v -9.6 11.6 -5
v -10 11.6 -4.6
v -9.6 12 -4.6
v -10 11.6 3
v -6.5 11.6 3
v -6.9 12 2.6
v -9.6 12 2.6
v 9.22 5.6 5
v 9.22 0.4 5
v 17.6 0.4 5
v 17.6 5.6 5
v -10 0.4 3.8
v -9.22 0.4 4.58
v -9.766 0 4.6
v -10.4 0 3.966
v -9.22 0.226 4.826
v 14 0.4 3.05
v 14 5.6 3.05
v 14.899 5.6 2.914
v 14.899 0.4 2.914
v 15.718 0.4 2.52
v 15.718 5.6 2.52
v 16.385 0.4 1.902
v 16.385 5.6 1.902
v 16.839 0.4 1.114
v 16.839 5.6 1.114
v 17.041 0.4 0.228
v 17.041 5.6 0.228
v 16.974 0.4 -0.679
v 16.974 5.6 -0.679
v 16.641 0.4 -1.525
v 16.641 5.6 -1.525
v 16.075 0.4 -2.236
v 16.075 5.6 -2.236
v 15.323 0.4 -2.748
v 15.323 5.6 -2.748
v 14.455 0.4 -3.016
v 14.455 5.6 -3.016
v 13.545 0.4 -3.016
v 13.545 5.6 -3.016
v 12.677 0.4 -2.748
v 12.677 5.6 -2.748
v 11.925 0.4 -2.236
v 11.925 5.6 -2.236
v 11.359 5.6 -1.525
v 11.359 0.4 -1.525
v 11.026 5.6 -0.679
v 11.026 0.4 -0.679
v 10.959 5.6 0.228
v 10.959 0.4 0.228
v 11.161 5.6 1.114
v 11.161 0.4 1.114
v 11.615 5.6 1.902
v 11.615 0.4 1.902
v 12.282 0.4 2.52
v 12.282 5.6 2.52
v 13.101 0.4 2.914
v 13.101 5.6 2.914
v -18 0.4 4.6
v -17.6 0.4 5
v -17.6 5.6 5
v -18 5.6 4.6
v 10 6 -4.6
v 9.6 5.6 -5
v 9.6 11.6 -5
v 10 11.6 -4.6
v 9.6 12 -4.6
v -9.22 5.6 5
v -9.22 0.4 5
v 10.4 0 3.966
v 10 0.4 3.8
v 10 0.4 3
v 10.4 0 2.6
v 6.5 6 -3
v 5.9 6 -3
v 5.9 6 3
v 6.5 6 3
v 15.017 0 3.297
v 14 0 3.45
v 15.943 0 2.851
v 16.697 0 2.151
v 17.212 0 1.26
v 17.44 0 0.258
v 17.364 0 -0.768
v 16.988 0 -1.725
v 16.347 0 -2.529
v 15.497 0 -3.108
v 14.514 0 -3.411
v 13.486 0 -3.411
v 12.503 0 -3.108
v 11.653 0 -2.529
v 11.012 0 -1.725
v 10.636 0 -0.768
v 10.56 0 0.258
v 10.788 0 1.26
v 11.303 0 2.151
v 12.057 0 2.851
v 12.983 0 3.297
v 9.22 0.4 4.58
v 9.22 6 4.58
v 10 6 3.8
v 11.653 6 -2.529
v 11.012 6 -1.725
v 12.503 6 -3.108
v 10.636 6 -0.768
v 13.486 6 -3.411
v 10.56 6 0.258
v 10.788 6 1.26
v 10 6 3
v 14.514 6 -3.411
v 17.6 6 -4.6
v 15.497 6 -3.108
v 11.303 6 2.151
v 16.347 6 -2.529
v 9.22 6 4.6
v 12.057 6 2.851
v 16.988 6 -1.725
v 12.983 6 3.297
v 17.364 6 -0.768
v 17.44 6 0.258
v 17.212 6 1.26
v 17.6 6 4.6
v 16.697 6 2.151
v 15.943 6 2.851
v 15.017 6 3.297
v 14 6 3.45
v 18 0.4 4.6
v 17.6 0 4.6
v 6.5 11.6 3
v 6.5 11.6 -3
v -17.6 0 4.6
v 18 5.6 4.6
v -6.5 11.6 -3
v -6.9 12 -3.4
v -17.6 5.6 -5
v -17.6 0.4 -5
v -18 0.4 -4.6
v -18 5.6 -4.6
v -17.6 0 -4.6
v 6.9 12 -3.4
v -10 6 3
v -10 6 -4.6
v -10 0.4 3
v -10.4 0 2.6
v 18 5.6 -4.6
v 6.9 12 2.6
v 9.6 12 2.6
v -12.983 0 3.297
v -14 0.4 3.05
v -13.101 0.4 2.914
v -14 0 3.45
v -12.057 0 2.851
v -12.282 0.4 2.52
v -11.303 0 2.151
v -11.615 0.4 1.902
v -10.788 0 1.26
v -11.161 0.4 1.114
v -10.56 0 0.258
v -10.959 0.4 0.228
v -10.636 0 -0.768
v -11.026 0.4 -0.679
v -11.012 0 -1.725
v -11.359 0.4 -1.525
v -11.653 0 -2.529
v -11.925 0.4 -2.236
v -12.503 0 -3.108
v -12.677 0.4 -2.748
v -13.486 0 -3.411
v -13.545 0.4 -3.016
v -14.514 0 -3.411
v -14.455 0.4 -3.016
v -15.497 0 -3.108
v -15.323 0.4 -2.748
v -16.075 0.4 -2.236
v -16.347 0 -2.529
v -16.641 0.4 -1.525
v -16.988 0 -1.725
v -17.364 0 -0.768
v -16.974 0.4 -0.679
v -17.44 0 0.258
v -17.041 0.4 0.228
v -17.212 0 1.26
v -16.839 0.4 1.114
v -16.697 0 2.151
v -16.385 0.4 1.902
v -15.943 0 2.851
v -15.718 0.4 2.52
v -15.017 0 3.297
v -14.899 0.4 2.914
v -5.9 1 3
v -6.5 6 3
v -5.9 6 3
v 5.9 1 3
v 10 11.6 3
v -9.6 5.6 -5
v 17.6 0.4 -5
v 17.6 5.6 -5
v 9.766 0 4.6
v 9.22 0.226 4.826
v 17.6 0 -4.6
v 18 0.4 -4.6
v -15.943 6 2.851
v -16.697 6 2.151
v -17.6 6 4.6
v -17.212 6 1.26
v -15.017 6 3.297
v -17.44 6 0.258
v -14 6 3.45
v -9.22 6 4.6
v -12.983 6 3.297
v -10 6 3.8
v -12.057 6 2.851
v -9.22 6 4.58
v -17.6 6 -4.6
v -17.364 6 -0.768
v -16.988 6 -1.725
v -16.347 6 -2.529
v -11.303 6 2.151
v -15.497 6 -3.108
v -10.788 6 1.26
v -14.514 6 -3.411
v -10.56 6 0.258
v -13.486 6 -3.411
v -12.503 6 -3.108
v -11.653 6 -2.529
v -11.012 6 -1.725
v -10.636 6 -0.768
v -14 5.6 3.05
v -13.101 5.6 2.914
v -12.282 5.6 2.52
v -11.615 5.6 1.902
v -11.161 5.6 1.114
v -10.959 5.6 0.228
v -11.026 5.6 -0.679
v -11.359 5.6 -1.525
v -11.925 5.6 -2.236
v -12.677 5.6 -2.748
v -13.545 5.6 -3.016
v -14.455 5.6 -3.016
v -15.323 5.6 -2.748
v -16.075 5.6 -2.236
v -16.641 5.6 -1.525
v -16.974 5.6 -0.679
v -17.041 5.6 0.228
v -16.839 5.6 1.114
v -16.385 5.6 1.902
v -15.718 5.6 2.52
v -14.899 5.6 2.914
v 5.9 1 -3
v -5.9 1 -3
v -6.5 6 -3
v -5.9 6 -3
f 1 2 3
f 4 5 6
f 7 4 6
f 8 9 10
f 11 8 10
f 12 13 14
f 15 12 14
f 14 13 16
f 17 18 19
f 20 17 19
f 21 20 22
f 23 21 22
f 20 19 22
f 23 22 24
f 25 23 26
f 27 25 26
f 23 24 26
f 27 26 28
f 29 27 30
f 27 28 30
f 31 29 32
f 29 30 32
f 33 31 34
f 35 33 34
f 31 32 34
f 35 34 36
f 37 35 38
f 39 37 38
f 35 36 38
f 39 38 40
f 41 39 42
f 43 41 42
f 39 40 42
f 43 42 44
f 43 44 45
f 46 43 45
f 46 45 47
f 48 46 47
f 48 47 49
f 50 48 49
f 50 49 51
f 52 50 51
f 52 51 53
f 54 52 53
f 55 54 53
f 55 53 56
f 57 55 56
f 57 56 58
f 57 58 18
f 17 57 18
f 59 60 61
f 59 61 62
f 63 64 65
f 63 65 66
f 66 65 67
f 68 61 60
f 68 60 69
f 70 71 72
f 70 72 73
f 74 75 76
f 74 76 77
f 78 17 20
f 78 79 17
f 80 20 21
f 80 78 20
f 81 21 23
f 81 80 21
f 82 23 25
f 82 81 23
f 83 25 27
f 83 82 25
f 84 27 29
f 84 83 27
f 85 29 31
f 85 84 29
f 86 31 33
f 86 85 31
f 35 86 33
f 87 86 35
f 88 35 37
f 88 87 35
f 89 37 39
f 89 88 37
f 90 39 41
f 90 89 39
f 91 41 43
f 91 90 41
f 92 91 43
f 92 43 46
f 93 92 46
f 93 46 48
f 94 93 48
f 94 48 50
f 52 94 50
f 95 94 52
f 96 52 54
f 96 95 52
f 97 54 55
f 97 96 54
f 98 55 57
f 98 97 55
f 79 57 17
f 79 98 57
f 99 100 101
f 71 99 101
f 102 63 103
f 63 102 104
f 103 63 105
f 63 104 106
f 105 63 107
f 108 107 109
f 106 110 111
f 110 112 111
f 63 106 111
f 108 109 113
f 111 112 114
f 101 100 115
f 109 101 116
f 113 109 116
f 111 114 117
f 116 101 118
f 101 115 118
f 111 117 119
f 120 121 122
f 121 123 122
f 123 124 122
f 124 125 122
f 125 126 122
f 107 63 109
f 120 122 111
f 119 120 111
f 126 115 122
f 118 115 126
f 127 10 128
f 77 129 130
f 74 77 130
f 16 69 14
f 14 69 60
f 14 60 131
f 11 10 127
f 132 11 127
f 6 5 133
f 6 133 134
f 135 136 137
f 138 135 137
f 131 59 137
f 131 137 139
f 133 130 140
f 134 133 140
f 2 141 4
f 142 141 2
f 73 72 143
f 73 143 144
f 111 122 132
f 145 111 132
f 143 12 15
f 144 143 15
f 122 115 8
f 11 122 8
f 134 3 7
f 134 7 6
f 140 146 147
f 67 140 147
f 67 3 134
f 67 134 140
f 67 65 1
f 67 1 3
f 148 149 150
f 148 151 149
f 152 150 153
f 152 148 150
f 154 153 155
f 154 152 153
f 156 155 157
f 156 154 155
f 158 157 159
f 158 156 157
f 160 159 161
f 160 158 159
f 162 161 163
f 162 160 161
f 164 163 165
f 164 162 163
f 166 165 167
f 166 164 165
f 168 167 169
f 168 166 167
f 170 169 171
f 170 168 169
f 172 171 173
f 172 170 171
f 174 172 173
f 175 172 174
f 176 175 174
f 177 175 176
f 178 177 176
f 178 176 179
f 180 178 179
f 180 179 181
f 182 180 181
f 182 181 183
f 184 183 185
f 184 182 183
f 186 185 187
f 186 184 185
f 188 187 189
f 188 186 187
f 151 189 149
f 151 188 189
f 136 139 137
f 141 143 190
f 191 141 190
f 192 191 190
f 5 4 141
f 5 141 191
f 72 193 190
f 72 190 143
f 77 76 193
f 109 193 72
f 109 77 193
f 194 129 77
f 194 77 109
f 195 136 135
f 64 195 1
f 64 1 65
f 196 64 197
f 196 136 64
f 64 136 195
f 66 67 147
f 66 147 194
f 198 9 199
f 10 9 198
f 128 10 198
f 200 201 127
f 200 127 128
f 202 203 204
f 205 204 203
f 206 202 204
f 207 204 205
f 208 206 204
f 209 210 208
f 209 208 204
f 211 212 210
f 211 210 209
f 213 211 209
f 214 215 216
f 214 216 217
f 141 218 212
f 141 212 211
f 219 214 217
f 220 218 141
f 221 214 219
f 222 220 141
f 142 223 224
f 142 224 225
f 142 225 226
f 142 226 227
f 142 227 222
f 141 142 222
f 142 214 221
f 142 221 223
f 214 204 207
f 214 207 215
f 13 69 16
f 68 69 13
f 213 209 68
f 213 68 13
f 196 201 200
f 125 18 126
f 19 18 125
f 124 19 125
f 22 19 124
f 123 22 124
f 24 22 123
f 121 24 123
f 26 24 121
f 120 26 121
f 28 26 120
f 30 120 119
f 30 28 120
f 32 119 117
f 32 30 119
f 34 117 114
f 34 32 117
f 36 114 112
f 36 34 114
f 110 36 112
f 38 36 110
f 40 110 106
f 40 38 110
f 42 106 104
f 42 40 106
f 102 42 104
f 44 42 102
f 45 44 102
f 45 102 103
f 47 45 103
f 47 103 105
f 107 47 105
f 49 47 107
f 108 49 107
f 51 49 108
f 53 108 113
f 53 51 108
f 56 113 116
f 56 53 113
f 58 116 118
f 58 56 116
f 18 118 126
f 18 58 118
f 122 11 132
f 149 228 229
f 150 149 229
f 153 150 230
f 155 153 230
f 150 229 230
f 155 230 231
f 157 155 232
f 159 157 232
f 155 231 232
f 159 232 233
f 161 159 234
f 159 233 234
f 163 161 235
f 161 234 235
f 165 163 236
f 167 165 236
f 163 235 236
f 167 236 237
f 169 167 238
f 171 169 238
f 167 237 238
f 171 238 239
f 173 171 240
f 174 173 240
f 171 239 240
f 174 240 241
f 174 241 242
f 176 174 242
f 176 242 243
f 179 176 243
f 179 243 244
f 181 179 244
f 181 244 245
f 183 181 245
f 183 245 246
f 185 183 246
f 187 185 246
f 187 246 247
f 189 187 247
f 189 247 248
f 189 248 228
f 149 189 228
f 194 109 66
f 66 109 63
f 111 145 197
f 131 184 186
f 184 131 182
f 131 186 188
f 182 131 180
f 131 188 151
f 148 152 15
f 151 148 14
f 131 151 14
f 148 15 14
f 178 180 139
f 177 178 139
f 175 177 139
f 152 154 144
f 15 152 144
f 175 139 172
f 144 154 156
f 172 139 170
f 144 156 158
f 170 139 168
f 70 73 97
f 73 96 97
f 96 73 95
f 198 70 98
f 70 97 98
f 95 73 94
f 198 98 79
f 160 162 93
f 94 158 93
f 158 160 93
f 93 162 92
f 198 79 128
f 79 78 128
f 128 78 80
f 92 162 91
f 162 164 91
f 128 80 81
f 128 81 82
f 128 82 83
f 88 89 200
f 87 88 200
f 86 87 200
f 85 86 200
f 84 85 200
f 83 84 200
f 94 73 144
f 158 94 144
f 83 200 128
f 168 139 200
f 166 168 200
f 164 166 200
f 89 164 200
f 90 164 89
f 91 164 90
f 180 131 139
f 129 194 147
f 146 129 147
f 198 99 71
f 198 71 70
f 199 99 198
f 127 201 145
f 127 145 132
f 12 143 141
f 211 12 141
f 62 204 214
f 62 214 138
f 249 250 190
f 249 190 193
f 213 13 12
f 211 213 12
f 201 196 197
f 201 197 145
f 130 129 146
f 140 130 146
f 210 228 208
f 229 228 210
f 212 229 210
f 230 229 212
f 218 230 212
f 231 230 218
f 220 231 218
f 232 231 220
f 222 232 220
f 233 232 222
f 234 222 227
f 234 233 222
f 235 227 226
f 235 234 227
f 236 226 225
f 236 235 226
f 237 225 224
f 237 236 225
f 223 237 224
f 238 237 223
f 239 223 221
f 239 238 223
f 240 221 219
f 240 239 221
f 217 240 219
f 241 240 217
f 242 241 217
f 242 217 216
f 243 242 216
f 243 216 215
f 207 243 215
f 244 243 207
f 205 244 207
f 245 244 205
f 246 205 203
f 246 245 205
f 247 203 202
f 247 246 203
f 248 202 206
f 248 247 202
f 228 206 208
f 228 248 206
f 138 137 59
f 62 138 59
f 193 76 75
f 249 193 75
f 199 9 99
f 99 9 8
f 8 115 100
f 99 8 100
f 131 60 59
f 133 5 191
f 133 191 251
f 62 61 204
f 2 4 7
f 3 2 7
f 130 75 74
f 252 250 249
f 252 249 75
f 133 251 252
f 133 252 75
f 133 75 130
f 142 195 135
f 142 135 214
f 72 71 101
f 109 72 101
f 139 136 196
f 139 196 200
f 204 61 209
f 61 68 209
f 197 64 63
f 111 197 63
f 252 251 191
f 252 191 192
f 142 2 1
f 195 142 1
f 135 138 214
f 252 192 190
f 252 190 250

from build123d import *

# Parameters (mm, degrees)
SKETCH1_W           = 20
SKETCH1_H           = 10
BOSS_EXTRUDE1_DEPTH = 12
SKETCH2_W           = 36
SKETCH2_H           = 10
BOSS_EXTRUDE2_DEPTH = 6
SKETCH3_R           = 3.05
CUT_EXTRUDE1_DEPTH  = 20.62141687
SKETCH4_W           = 13
SKETCH4_H           = 6
CUT_EXTRUDE2_DEPTH  = 6
SKETCH5_W           = 20
SKETCH5_H           = 12
CUT_EXTRUDE3_DEPTH  = 2
SKETCH6_W           = 11.8
SKETCH6_H           = 6
CUT_EXTRUDE4_DEPTH  = 5
BOSS_EXTRUDE3_DEPTH = 6


with BuildPart() as part:
    # Sketch1 → Boss-Extrude1 (new body)
    with BuildSketch(Plane(origin=(0, 0, 0), x_dir=(1, 0, 0), z_dir=(0, 1, 0))):
        Rectangle(SKETCH1_W, SKETCH1_H)
    extrude(amount=BOSS_EXTRUDE1_DEPTH)

    # Sketch2 → Boss-Extrude2 (add)
    with BuildSketch(Plane.XZ):
        Rectangle(SKETCH2_W, SKETCH2_H)
    extrude(amount=-BOSS_EXTRUDE2_DEPTH)

    # Sketch3 → Cut-Extrude1 (cut, through all)
    with BuildSketch(Plane(origin=(0, 6, 0), x_dir=(1, 0, 0), z_dir=(0, 1, 0))):
        with Locations(Location((-14, 0, 0), (0, 0, 270))):
            Circle(SKETCH3_R)
        with Locations(Location((14, 0, 0), (0, 0, 270))):
            Circle(SKETCH3_R)
    extrude(amount=-CUT_EXTRUDE1_DEPTH, mode=Mode.SUBTRACT)

    # Sketch4 → Cut-Extrude2 (cut)
    with BuildSketch(Plane(origin=(0, 12, 0), x_dir=(1, 0, 0), z_dir=(0, 1, 0))):
        Rectangle(SKETCH4_W, SKETCH4_H)
    extrude(amount=-CUT_EXTRUDE2_DEPTH, mode=Mode.SUBTRACT)

    # Sketch5 → Cut-Extrude3 (cut)
    with BuildSketch(Plane.XY.offset(5)):
        with Locations((0, 6)):
            Rectangle(SKETCH5_W, SKETCH5_H)
    extrude(amount=-CUT_EXTRUDE3_DEPTH, mode=Mode.SUBTRACT)

    # Sketch6 → Cut-Extrude4 (cut)
    with BuildSketch(Plane(origin=(0, 6, 0), x_dir=(1, 0, 0), z_dir=(0, 1, 0))):
        Rectangle(SKETCH6_W, SKETCH6_H)
    extrude(amount=-CUT_EXTRUDE4_DEPTH, mode=Mode.SUBTRACT)

    # Sketch7 → Boss-Extrude3 (add)
    with BuildSketch(Plane(origin=(0, 6, 0), x_dir=(1, 0, 0), z_dir=(0, 1, 0))):
        Polygon((-10, -5), (-9.22, -5), (-9.22, -4.58), (-10, -3.8), align=None)
        Polygon((10, -3.8), (10, -5), (9.22, -5), (9.22, -4.58), align=None)
    extrude(amount=-BOSS_EXTRUDE3_DEPTH)

    # Chamfer1
    # the kernel refuses this chamfer: 0.4 mm, written as the material it takes off along each edge
    with BuildSketch(Plane(origin=(17.733333333, 5.733333333, 4.733333333), x_dir=(0.7071067811865491, 0, -0.7071067811865459), z_dir=(0.5773502691896257, 0.5773502691896232, 0.5773502691896283)), Plane(origin=(17.733333333, 5.733333333, -4.733333333), x_dir=(-0.7071067811865444, 0, -0.7071067811865506), z_dir=(0.5773502691896283, 0.5773502691896257, -0.5773502691896232)), Plane(origin=(-17.733333333, 0.266666667, 4.733333333), x_dir=(-0.707106781186546, 0, -0.7071067811865491), z_dir=(-0.5773502691896272, -0.5773502691896252, 0.5773502691896248))) as chamfer1_piece_1:
        Polygon((-0.282842712, -0.163299316), (0.282842712, -0.163299316), (0, 0.326598632), align=None)
    extrude(amount=0.508068237, mode=Mode.SUBTRACT)
    with BuildSketch(Plane(origin=(17.733333333, 0.266666667, 4.733333333), x_dir=(-6.2803698347350965e-15, 0.7071067811865472, 0.7071067811865478), z_dir=(0.5773502691896255, -0.5773502691896235, 0.5773502691896282)), Plane(origin=(17.733333333, 0.266666667, -4.733333333), x_dir=(0.7071067811865462, 0.7071067811865488, 0), z_dir=(0.5773502691896282, -0.5773502691896261, -0.5773502691896231)), Plane(origin=(-17.733333333, 0.266666667, -4.733333333), x_dir=(0.7071067811865462, -0.7071067811865488, 0), z_dir=(-0.5773502691896264, -0.5773502691896244, -0.5773502691896264)), Plane(origin=(-17.733333333, 5.733333333, 4.733333333), x_dir=(0, -0.7071067811865475, 0.7071067811865475), z_dir=(-0.5773502691896275, 0.577350269189625, 0.577350269189625)), Plane(origin=(-17.733333333, 5.733333333, -4.733333333), x_dir=(-0.707106781186546, -0.7071067811865491, 0), z_dir=(-0.5773502691896266, 0.577350269189624, -0.5773502691896266)), Plane(origin=(-9.733333333, 11.733333333, -4.733333333), x_dir=(-0.7071067811865475, -0.7071067811865475, 0), z_dir=(-0.577350269189625, 0.577350269189625, -0.5773502691896275)), Plane(origin=(9.733333333, 11.733333333, -4.733333333), x_dir=(0, -0.7071067811865475, -0.7071067811865475), z_dir=(0.5773502691896257, 0.5773502691896257, -0.5773502691896257))) as chamfer1_piece_2:
        Polygon((-0.282842712, 0.163299316), (0.282842712, 0.163299316), (0, -0.326598632), align=None)
    extrude(amount=0.508068237, mode=Mode.SUBTRACT)
    with BuildSketch(Plane(origin=(14, 0, 0), x_dir=(0, 0, 1), z_dir=(-1, 0, 0))) as chamfer1_piece_3:
        with BuildLine():
            Line((3.038686292, 0.411313708), (3.461313708, -0.011313708))
            Line((3.461313708, -0.011313708), (3.461313708, -0.019313708))
            ThreePointArc((3.461313708, -0.019313708), (3.255656854, -0.008), (3.05, -0.008))
            Line((3.05, -0.008), (3.042, 0))
            ThreePointArc((3.042, 0), (3.042, 0.205656854), (3.030686292, 0.411313708))
            Line((3.030686292, 0.411313708), (3.038686292, 0.411313708))
        make_face()
    revolve(axis=Axis((14, 0, 0), (0, 1, 0)), mode=Mode.SUBTRACT)
    with BuildSketch(Plane(origin=(14, 6, 0), x_dir=(0, 0, 1), z_dir=(-1, 0, 0))) as chamfer1_piece_4:
        with BuildLine():
            Line((3.461313708, 0.011313708), (3.038686292, -0.411313708))
            Line((3.038686292, -0.411313708), (3.030686292, -0.411313708))
            ThreePointArc((3.030686292, -0.411313708), (3.042, -0.205656854), (3.042, 0))
            Line((3.042, 0), (3.05, 0.008))
            ThreePointArc((3.05, 0.008), (3.255656854, 0.008), (3.461313708, 0.019313708))
            Line((3.461313708, 0.019313708), (3.461313708, 0.011313708))
        make_face()
    revolve(axis=Axis((14, 6, 0), (0, 1, 0)), mode=Mode.SUBTRACT)
    with BuildSketch(Plane(origin=(-14, 0, 0), x_dir=(0, 0, 1), z_dir=(-1, 0, 0))) as chamfer1_piece_5:
        with BuildLine():
            Line((3.038686292, 0.411313708), (3.461313708, -0.011313708))
            Line((3.461313708, -0.011313708), (3.461313708, -0.019313708))
            ThreePointArc((3.461313708, -0.019313708), (3.255656854, -0.008), (3.05, -0.008))
            Line((3.05, -0.008), (3.042, 0))
            ThreePointArc((3.042, 0), (3.042, 0.205656854), (3.030686292, 0.411313708))
            Line((3.030686292, 0.411313708), (3.038686292, 0.411313708))
        make_face()
    revolve(axis=Axis((-14, 0, 0), (0, 1, 0)), mode=Mode.SUBTRACT)
    with BuildSketch(Plane(origin=(-14, 6, 0), x_dir=(0, 0, 1), z_dir=(-1, 0, 0))) as chamfer1_piece_6:
        with BuildLine():
            Line((3.461313708, 0.011313708), (3.038686292, -0.411313708))
            Line((3.038686292, -0.411313708), (3.030686292, -0.411313708))
            ThreePointArc((3.030686292, -0.411313708), (3.042, -0.205656854), (3.042, 0))
            Line((3.042, 0), (3.05, 0.008))
            ThreePointArc((3.05, 0.008), (3.255656854, 0.008), (3.461313708, 0.019313708))
            Line((3.461313708, 0.019313708), (3.461313708, 0.011313708))
        make_face()
    revolve(axis=Axis((-14, 6, 0), (0, 1, 0)), mode=Mode.SUBTRACT)
    with BuildSketch(Plane(origin=(10, 0, 3), x_dir=(0, 0.9996219169112968, 0.02749587661058625), z_dir=(-1, 0, 0))) as chamfer1_piece_7:
        with BuildLine():
            Line((0.411469278, 0), (-0.022618862, 0.410847117))
            Line((-0.022618862, 0.410847117), (-0.030615837, 0.41062715))
            ThreePointArc((-0.030615837, 0.41062715), (-0.013651691, 0.205359132), (-0.007996975, -0.000219967))
            Line((-0.007996975, -0.000219967), (0.000219967, -0.007996975))
            ThreePointArc((0.000219967, -0.007996975), (0.205799066, -0.00234226), (0.411689245, -0.007996975))
            Line((0.411689245, -0.007996975), (0.411469278, 0))
        make_face()
    extrude(amount=20, mode=Mode.SUBTRACT)
    with BuildSketch(Plane(origin=(10, 0, 4.828673195), x_dir=(-0.027495876610587326, 0.9996219169112966, 0), z_dir=(0, 0, -1))) as chamfer1_piece_8_section:
        with BuildLine():
            Line((0.411469278, 0), (-0.022618862, 0.410847117))
            Line((-0.022618862, 0.410847117), (-0.030615837, 0.41062715))
            ThreePointArc((-0.030615837, 0.41062715), (-0.013651691, 0.205359132), (-0.007996975, -0.000219967))
            Line((-0.007996975, -0.000219967), (0.000219967, -0.007996975))
            ThreePointArc((0.000219967, -0.007996975), (0.205799066, -0.00234226), (0.411689245, -0.007996975))
            Line((0.411689245, -0.007996975), (0.411469278, 0))
        make_face()
    chamfer1_piece_8 = extrude(amount=1.828673195, mode=Mode.PRIVATE)
    chamfer1_piece_8 = split(chamfer1_piece_8, bisect_by=Plane(origin=(10.287531855, 0.140047879, 3.512468145), z_dir=(-0.7071067811865437, 0, -0.7071067811865513)), keep=Keep.TOP, mode=Mode.PRIVATE)
    add(chamfer1_piece_8, mode=Mode.SUBTRACT)
    with BuildSketch(Plane(origin=(8.492618208, 0, 5.307381792), x_dir=(-0.019442520806013025, 0.9996219169112968, -0.019442520806013233), z_dir=(0.7071067811865513, 0, -0.7071067811865437))) as chamfer1_piece_9_section:
        with BuildLine():
            Line((0.411469278, 0), (-0.022618862, 0.410847117))
            Line((-0.022618862, 0.410847117), (-0.030615837, 0.41062715))
            ThreePointArc((-0.030615837, 0.41062715), (-0.013651691, 0.205359132), (-0.007996975, -0.000219967))
            Line((-0.007996975, -0.000219967), (0.000219967, -0.007996975))
            ThreePointArc((0.000219967, -0.007996975), (0.205799066, -0.00234226), (0.411689245, -0.007996975))
            Line((0.411689245, -0.007996975), (0.411469278, 0))
        make_face()
    chamfer1_piece_9 = extrude(amount=3.160432969, mode=Mode.PRIVATE)
    chamfer1_piece_9 = split(chamfer1_piece_9, bisect_by=Plane(origin=(10, 0.134633563, 4.688221688), z_dir=(-1, 0, 0)), keep=Keep.TOP, mode=Mode.PRIVATE)
    add(chamfer1_piece_9, mode=Mode.SUBTRACT)
    with BuildSketch(Plane(origin=(19.028673195, 6, 5), x_dir=(0, 0.027495876610587302, -0.9996219169112966), z_dir=(-1, 0, 0)), Plane(origin=(19.028673195, 0, 5), x_dir=(0, 0.9996219169112966, 0.02749587661058735), z_dir=(-1, 0, 0))) as chamfer1_piece_10:
        with BuildLine():
            Line((0.411469278, 0), (-0.022618862, 0.410847117))
            Line((-0.022618862, 0.410847117), (-0.030615837, 0.41062715))
            ThreePointArc((-0.030615837, 0.41062715), (-0.013651691, 0.205359132), (-0.007996975, -0.000219967))
            Line((-0.007996975, -0.000219967), (0.000219967, -0.007996975))
            ThreePointArc((0.000219967, -0.007996975), (0.205799066, -0.00234226), (0.411689245, -0.007996975))
            Line((0.411689245, -0.007996975), (0.411469278, 0))
        make_face()
    extrude(amount=10.83734639, mode=Mode.SUBTRACT)
    with BuildSketch(Plane(origin=(18, 0, -6.028673195), x_dir=(0.02749587661058735, 0.9996219169112966, 0), z_dir=(0, 0, 1)), Plane(origin=(18, 6, -6.028673195), x_dir=(-0.9996219169112966, 0.02749587661058742, 0), z_dir=(0, 0, 1)), Plane(origin=(-18, 0, 6.028673195), x_dir=(-0.02749587661058735, 0.9996219169112966, 0), z_dir=(0, 0, -1)), Plane(origin=(-18, 6, 6.028673195), x_dir=(0.9996219169112966, 0.02749587661058742, 0), z_dir=(0, 0, -1))) as chamfer1_piece_11:
        with BuildLine():
            Line((0.411469278, 0), (-0.022618862, 0.410847117))
            Line((-0.022618862, 0.410847117), (-0.030615837, 0.41062715))
            ThreePointArc((-0.030615837, 0.41062715), (-0.013651691, 0.205359132), (-0.007996975, -0.000219967))
            Line((-0.007996975, -0.000219967), (0.000219967, -0.007996975))
            ThreePointArc((0.000219967, -0.007996975), (0.205799066, -0.00234226), (0.411689245, -0.007996975))
            Line((0.411689245, -0.007996975), (0.411469278, 0))
        make_face()
    extrude(amount=12.05734639, mode=Mode.SUBTRACT)
    with BuildSketch(Plane(origin=(-19.028673195, 0, -5), x_dir=(0, 0.9996219169112966, -0.02749587661058735), z_dir=(1, 0, 0))) as chamfer1_piece_12:
        with BuildLine():
            Line((0.411469278, 0), (-0.022618862, 0.410847117))
            Line((-0.022618862, 0.410847117), (-0.030615837, 0.41062715))
            ThreePointArc((-0.030615837, 0.41062715), (-0.013651691, 0.205359132), (-0.007996975, -0.000219967))
            Line((-0.007996975, -0.000219967), (0.000219967, -0.007996975))
            ThreePointArc((0.000219967, -0.007996975), (0.205799066, -0.00234226), (0.411689245, -0.007996975))
            Line((0.411689245, -0.007996975), (0.411469278, 0))
        make_face()
    extrude(amount=38.05734639, mode=Mode.SUBTRACT)
    with BuildSketch(Plane(origin=(-19.028673195, 0, 5), x_dir=(0, 0.9996219169112966, 0.02749587661058735), z_dir=(1, 0, 0)), Plane(origin=(-8.191326805, 6, 5), x_dir=(0, -0.9996219169112966, 0.027495876610587302), z_dir=(-1, 0, 0))) as chamfer1_piece_13:
        with BuildLine():
            Line((0.411469278, 0), (-0.022618862, -0.410847117))
            Line((-0.022618862, -0.410847117), (-0.030615837, -0.41062715))
            ThreePointArc((-0.030615837, -0.41062715), (-0.013651691, -0.205359132), (-0.007996975, 0.000219967))
            Line((-0.007996975, 0.000219967), (0.000219967, 0.007996975))
            ThreePointArc((0.000219967, 0.007996975), (0.205799066, 0.00234226), (0.411689245, 0.007996975))
            Line((0.411689245, 0.007996975), (0.411469278, 0))
        make_face()
    extrude(amount=10.83734639, mode=Mode.SUBTRACT)
    with BuildSketch(Plane(origin=(-8.492618208, 0, 5.307381792), x_dir=(0.019442520806011977, 0.9996219169112968, -0.019442520806012123), z_dir=(-0.7071067811865501, 0, -0.7071067811865449))) as chamfer1_piece_14_section:
        with BuildLine():
            Line((0.411469278, 0), (-0.022618862, -0.410847117))
            Line((-0.022618862, -0.410847117), (-0.030615837, -0.41062715))
            ThreePointArc((-0.030615837, -0.41062715), (-0.013651691, -0.205359132), (-0.007996975, 0.000219967))
            Line((-0.007996975, 0.000219967), (0.000219967, 0.007996975))
            ThreePointArc((0.000219967, 0.007996975), (0.205799066, 0.00234226), (0.411689245, 0.007996975))
            Line((0.411689245, 0.007996975), (0.411469278, 0))
        make_face()
    chamfer1_piece_14 = extrude(amount=3.160432969, mode=Mode.PRIVATE)
    chamfer1_piece_14 = split(chamfer1_piece_14, bisect_by=Plane(origin=(-10, 0.134633563, 4.688221688), z_dir=(1, 0, 0)), keep=Keep.TOP, mode=Mode.PRIVATE)
    add(chamfer1_piece_14, mode=Mode.SUBTRACT)
    with BuildSketch(Plane(origin=(-10, 0, 4.828673195), x_dir=(0.02749587661058735, 0.9996219169112966, 0), z_dir=(0, 0, -1))) as chamfer1_piece_15_section:
        with BuildLine():
            Line((0.411469278, 0), (-0.022618862, -0.410847117))
            Line((-0.022618862, -0.410847117), (-0.030615837, -0.41062715))
            ThreePointArc((-0.030615837, -0.41062715), (-0.013651691, -0.205359132), (-0.007996975, 0.000219967))
            Line((-0.007996975, 0.000219967), (0.000219967, 0.007996975))
            ThreePointArc((0.000219967, 0.007996975), (0.205799066, 0.00234226), (0.411689245, 0.007996975))
            Line((0.411689245, 0.007996975), (0.411469278, 0))
        make_face()
    chamfer1_piece_15 = extrude(amount=1.828673195, mode=Mode.PRIVATE)
    chamfer1_piece_15 = split(chamfer1_piece_15, bisect_by=Plane(origin=(-10.287531855, 0.140047879, 3.512468145), z_dir=(0.7071067811865449, 0, -0.7071067811865501)), keep=Keep.TOP, mode=Mode.PRIVATE)
    add(chamfer1_piece_15, mode=Mode.SUBTRACT)
    with BuildSketch(Plane(origin=(6.5, 12, 4.028673195), x_dir=(-0.027495876610587302, -0.9996219169112966, 0), z_dir=(0, 0, -1)), Plane(origin=(-6.5, 12, -3), x_dir=(0.027495876610587302, -0.9996219169112966, 0), z_dir=(0, 0, 1))) as chamfer1_piece_16:
        with BuildLine():
            Line((0.411469278, 0), (-0.022618862, -0.410847117))
            Line((-0.022618862, -0.410847117), (-0.030615837, -0.41062715))
            ThreePointArc((-0.030615837, -0.41062715), (-0.013651691, -0.205359132), (-0.007996975, 0.000219967))
            Line((-0.007996975, 0.000219967), (0.000219967, 0.007996975))
            ThreePointArc((0.000219967, 0.007996975), (0.205799066, 0.00234226), (0.411689245, 0.007996975))
            Line((0.411689245, 0.007996975), (0.411469278, 0))
        make_face()
    extrude(amount=7.028673195, mode=Mode.SUBTRACT)
    with BuildSketch(Plane(origin=(6.5, 12, -3), x_dir=(0, -0.9996219169112968, 0.027495876610586226), z_dir=(-1, 0, 0))) as chamfer1_piece_17:
        with BuildLine():
            Line((0.411469278, 0), (-0.022618862, -0.410847117))
            Line((-0.022618862, -0.410847117), (-0.030615837, -0.41062715))
            ThreePointArc((-0.030615837, -0.41062715), (-0.013651691, -0.205359132), (-0.007996975, 0.000219967))
            Line((-0.007996975, 0.000219967), (0.000219967, 0.007996975))
            ThreePointArc((0.000219967, 0.007996975), (0.205799066, 0.00234226), (0.411689245, 0.007996975))
            Line((0.411689245, 0.007996975), (0.411469278, 0))
        make_face()
    extrude(amount=13, mode=Mode.SUBTRACT)
    with BuildSketch(Plane(origin=(-11.028673195, 12, 3), x_dir=(0, -0.9996219169112968, 0.027495876610586226), z_dir=(1, 0, 0)), Plane(origin=(5.471326805, 12, 3), x_dir=(0, -0.9996219169112968, 0.027495876610586226), z_dir=(1, 0, 0))) as chamfer1_piece_18:
        with BuildLine():
            Line((0.411469278, 0), (-0.022618862, 0.410847117))
            Line((-0.022618862, 0.410847117), (-0.030615837, 0.41062715))
            ThreePointArc((-0.030615837, 0.41062715), (-0.013651691, 0.205359132), (-0.007996975, -0.000219967))
            Line((-0.007996975, -0.000219967), (0.000219967, -0.007996975))
            ThreePointArc((0.000219967, -0.007996975), (0.205799066, -0.00234226), (0.411689245, -0.007996975))
            Line((0.411689245, -0.007996975), (0.411469278, 0))
        make_face()
    extrude(amount=5.55734639, mode=Mode.SUBTRACT)
    with BuildSketch(Plane(origin=(-10, 12, -6.028673195), x_dir=(-0.027495876610587302, -0.9996219169112966, 0), z_dir=(0, 0, 1))) as chamfer1_piece_19:
        with BuildLine():
            Line((0.411469278, 0), (-0.022618862, 0.410847117))
            Line((-0.022618862, 0.410847117), (-0.030615837, 0.41062715))
            ThreePointArc((-0.030615837, 0.41062715), (-0.013651691, 0.205359132), (-0.007996975, -0.000219967))
            Line((-0.007996975, -0.000219967), (0.000219967, -0.007996975))
            ThreePointArc((0.000219967, -0.007996975), (0.205799066, -0.00234226), (0.411689245, -0.007996975))
            Line((0.411689245, -0.007996975), (0.411469278, 0))
        make_face()
    extrude(amount=10.05734639, mode=Mode.SUBTRACT)
    with BuildSketch(Plane(origin=(11.028673195, 12, -5), x_dir=(0, -0.9996219169112966, -0.027495876610587302), z_dir=(-1, 0, 0))) as chamfer1_piece_20:
        with BuildLine():
            Line((0.411469278, 0), (-0.022618862, 0.410847117))
            Line((-0.022618862, 0.410847117), (-0.030615837, 0.41062715))
            ThreePointArc((-0.030615837, 0.41062715), (-0.013651691, 0.205359132), (-0.007996975, -0.000219967))
            Line((-0.007996975, -0.000219967), (0.000219967, -0.007996975))
            ThreePointArc((0.000219967, -0.007996975), (0.205799066, -0.00234226), (0.411689245, -0.007996975))
            Line((0.411689245, -0.007996975), (0.411469278, 0))
        make_face()
    extrude(amount=22.05734639, mode=Mode.SUBTRACT)
    with BuildSketch(Plane(origin=(10, 12, 4.028673195), x_dir=(-0.9996219169112966, 0.027495876610587302, 0), z_dir=(0, 0, -1))) as chamfer1_piece_21:
        with BuildLine():
            Line((0.411469278, 0), (-0.022618862, -0.410847117))
            Line((-0.022618862, -0.410847117), (-0.030615837, -0.41062715))
            ThreePointArc((-0.030615837, -0.41062715), (-0.013651691, -0.205359132), (-0.007996975, 0.000219967))
            Line((-0.007996975, 0.000219967), (0.000219967, 0.007996975))
            ThreePointArc((0.000219967, 0.007996975), (0.205799066, 0.00234226), (0.411689245, 0.007996975))
            Line((0.411689245, 0.007996975), (0.411469278, 0))
        make_face()
    extrude(amount=10.05734639, mode=Mode.SUBTRACT)
    with BuildSketch(Plane(origin=(10, 6, -5), x_dir=(-0.9996219169112966, 0, -0.027495876610587302), z_dir=(0, 1, 0)), Plane(origin=(-10, 6, -5), x_dir=(-0.027495876610587302, 0, 0.9996219169112966), z_dir=(0, 1, 0))) as chamfer1_piece_22:
        with BuildLine():
            Line((0.411469278, 0), (-0.022618862, 0.410847117))
            Line((-0.022618862, 0.410847117), (-0.030615837, 0.41062715))
            ThreePointArc((-0.030615837, 0.41062715), (-0.013651691, 0.205359132), (-0.007996975, -0.000219967))
            Line((-0.007996975, -0.000219967), (0.000219967, -0.007996975))
            ThreePointArc((0.000219967, -0.007996975), (0.205799066, -0.00234226), (0.411689245, -0.007996975))
            Line((0.411689245, -0.007996975), (0.411469278, 0))
        make_face()
    extrude(amount=7.028673195, mode=Mode.SUBTRACT)
    with BuildSketch(Plane(origin=(10, 6, -5), x_dir=(0, -0.9996219169112966, -0.027495876610591618), z_dir=(1, 0, 0)), Plane(origin=(-19.028673195, 6, -5), x_dir=(0, -0.9996219169112966, -0.027495876610587302), z_dir=(1, 0, 0))) as chamfer1_piece_23:
        with BuildLine():
            Line((0.411469278, 0), (-0.022618862, -0.410847117))
            Line((-0.022618862, -0.410847117), (-0.030615837, -0.41062715))
            ThreePointArc((-0.030615837, -0.41062715), (-0.013651691, -0.205359132), (-0.007996975, 0.000219967))
            Line((-0.007996975, 0.000219967), (0.000219967, 0.007996975))
            ThreePointArc((0.000219967, 0.007996975), (0.205799066, 0.00234226), (0.411689245, 0.007996975))
            Line((0.411689245, 0.007996975), (0.411469278, 0))
        make_face()
    extrude(amount=9.028673195, mode=Mode.SUBTRACT)
    with BuildSketch(Plane(origin=(18, -1.028673195, 5), x_dir=(-0.9996219169112966, 0, 0.02749587661058742), z_dir=(0, 1, 0)), Plane(origin=(-18, -1.028673195, -5), x_dir=(0.9996219169112966, 0, -0.02749587661058742), z_dir=(0, 1, 0))) as chamfer1_piece_24:
        with BuildLine():
            Line((0.411469278, 0), (-0.022618862, -0.410847117))
            Line((-0.022618862, -0.410847117), (-0.030615837, -0.41062715))
            ThreePointArc((-0.030615837, -0.41062715), (-0.013651691, -0.205359132), (-0.007996975, 0.000219967))
            Line((-0.007996975, 0.000219967), (0.000219967, 0.007996975))
            ThreePointArc((0.000219967, 0.007996975), (0.205799066, 0.00234226), (0.411689245, 0.007996975))
            Line((0.411689245, 0.007996975), (0.411469278, 0))
        make_face()
    extrude(amount=8.05734639, mode=Mode.SUBTRACT)
    with BuildSketch(Plane(origin=(18, -1.028673195, -5), x_dir=(-0.9996219169112966, 0, -0.02749587661058742), z_dir=(0, 1, 0)), Plane(origin=(-18, -1.028673195, 5), x_dir=(0.9996219169112966, 0, 0.02749587661058742), z_dir=(0, 1, 0))) as chamfer1_piece_25:
        with BuildLine():
            Line((0.411469278, 0), (-0.022618862, 0.410847117))
            Line((-0.022618862, 0.410847117), (-0.030615837, 0.41062715))
            ThreePointArc((-0.030615837, 0.41062715), (-0.013651691, 0.205359132), (-0.007996975, -0.000219967))
            Line((-0.007996975, -0.000219967), (0.000219967, -0.007996975))
            ThreePointArc((0.000219967, -0.007996975), (0.205799066, -0.00234226), (0.411689245, -0.007996975))
            Line((0.411689245, -0.007996975), (0.411469278, 0))
        make_face()
    extrude(amount=8.05734639, mode=Mode.SUBTRACT)
    with BuildSketch(Plane(origin=(11.028673195, 0, 3), x_dir=(0, 0.9996219169112968, 0.02749587661058625), z_dir=(-1, 0, 0))) as chamfer1_piece_26a_section:
        with BuildLine():
            Line((0.411469278, 0), (-0.022618862, 0.410847117))
            Line((-0.022618862, 0.410847117), (-0.030615837, 0.41062715))
            ThreePointArc((-0.030615837, 0.41062715), (-0.013651691, 0.205359132), (-0.007996975, -0.000219967))
            Line((-0.007996975, -0.000219967), (0.000219967, -0.007996975))
            ThreePointArc((0.000219967, -0.007996975), (0.205799066, -0.00234226), (0.411689245, -0.007996975))
            Line((0.411689245, -0.007996975), (0.411469278, 0))
        make_face()
    chamfer1_piece_26a = extrude(amount=21.028673195, mode=Mode.PRIVATE)
    chamfer1_piece_26a = split(chamfer1_piece_26a, bisect_by=Plane(origin=(10, 0.131917451, 2.868082549), z_dir=(1, 0, 0)), keep=Keep.TOP, mode=Mode.PRIVATE)
    with BuildSketch(Plane(origin=(10, 0, 4.828673195), x_dir=(-0.027495876610587326, 0.9996219169112966, 0), z_dir=(0, 0, -1))) as chamfer1_piece_26b_section:
        with BuildLine():
            Line((0.411469278, 0), (-0.022618862, 0.410847117))
            Line((-0.022618862, 0.410847117), (-0.030615837, 0.41062715))
            ThreePointArc((-0.030615837, 0.41062715), (-0.013651691, 0.205359132), (-0.007996975, -0.000219967))
            Line((-0.007996975, -0.000219967), (0.000219967, -0.007996975))
            ThreePointArc((0.000219967, -0.007996975), (0.205799066, -0.00234226), (0.411689245, -0.007996975))
            Line((0.411689245, -0.007996975), (0.411469278, 0))
        make_face()
    chamfer1_piece_26b = extrude(amount=2.85734639, mode=Mode.PRIVATE)
    chamfer1_piece_26b = split(chamfer1_piece_26b, bisect_by=Plane(origin=(10.131917451, 0.131917451, 3), z_dir=(0, 0, -1)), keep=Keep.TOP, mode=Mode.PRIVATE)
    chamfer1_piece_26 = chamfer1_piece_26a & chamfer1_piece_26b
    add(chamfer1_piece_26, mode=Mode.SUBTRACT)
    with BuildSketch(Plane(origin=(-10, 0, 4.828673195), x_dir=(0.02749587661058735, 0.9996219169112966, 0), z_dir=(0, 0, -1))) as chamfer1_piece_27a_section:
        with BuildLine():
            Line((0.411469278, 0), (-0.022618862, -0.410847117))
            Line((-0.022618862, -0.410847117), (-0.030615837, -0.41062715))
            ThreePointArc((-0.030615837, -0.41062715), (-0.013651691, -0.205359132), (-0.007996975, 0.000219967))
            Line((-0.007996975, 0.000219967), (0.000219967, 0.007996975))
            ThreePointArc((0.000219967, 0.007996975), (0.205799066, 0.00234226), (0.411689245, 0.007996975))
            Line((0.411689245, 0.007996975), (0.411469278, 0))
        make_face()
    chamfer1_piece_27a = extrude(amount=2.85734639, mode=Mode.PRIVATE)
    chamfer1_piece_27a = split(chamfer1_piece_27a, bisect_by=Plane(origin=(-10.131917451, 0.131917451, 3), z_dir=(0, 0, -1)), keep=Keep.TOP, mode=Mode.PRIVATE)
    with BuildSketch(Plane(origin=(10, 0, 3), x_dir=(0, 0.9996219169112968, 0.02749587661058625), z_dir=(-1, 0, 0))) as chamfer1_piece_27b_section:
        with BuildLine():
            Line((0.411469278, 0), (-0.022618862, 0.410847117))
            Line((-0.022618862, 0.410847117), (-0.030615837, 0.41062715))
            ThreePointArc((-0.030615837, 0.41062715), (-0.013651691, 0.205359132), (-0.007996975, -0.000219967))
            Line((-0.007996975, -0.000219967), (0.000219967, -0.007996975))
            ThreePointArc((0.000219967, -0.007996975), (0.205799066, -0.00234226), (0.411689245, -0.007996975))
            Line((0.411689245, -0.007996975), (0.411469278, 0))
        make_face()
    chamfer1_piece_27b = extrude(amount=21.028673195, mode=Mode.PRIVATE)
    chamfer1_piece_27b = split(chamfer1_piece_27b, bisect_by=Plane(origin=(-10, 0.131917451, 2.868082549), z_dir=(-1, 0, 0)), keep=Keep.TOP, mode=Mode.PRIVATE)
    chamfer1_piece_27 = chamfer1_piece_27a & chamfer1_piece_27b
    add(chamfer1_piece_27, mode=Mode.SUBTRACT)
    with BuildSketch(Plane(origin=(8.492618208, 0, 5.307381792), x_dir=(-0.019442520806013025, 0.9996219169112968, -0.019442520806013233), z_dir=(0.7071067811865513, 0, -0.7071067811865437))) as chamfer1_piece_28a_section:
        with BuildLine():
            Line((0.411469278, 0), (-0.022618862, 0.410847117))
            Line((-0.022618862, 0.410847117), (-0.030615837, 0.41062715))
            ThreePointArc((-0.030615837, 0.41062715), (-0.013651691, 0.205359132), (-0.007996975, -0.000219967))
            Line((-0.007996975, -0.000219967), (0.000219967, -0.007996975))
            ThreePointArc((0.000219967, -0.007996975), (0.205799066, -0.00234226), (0.411689245, -0.007996975))
            Line((0.411689245, -0.007996975), (0.411469278, 0))
        make_face()
    chamfer1_piece_28a = extrude(amount=3.160432969, mode=Mode.PRIVATE)
    chamfer1_piece_28a = split(chamfer1_piece_28a, bisect_by=Plane(origin=(10, 0.12723725, 3.585514254), z_dir=(1, 0, 0)), keep=Keep.TOP, mode=Mode.PRIVATE)
    with BuildSketch(Plane(origin=(10, 0, 4.828673195), x_dir=(-0.027495876610587326, 0.9996219169112966, 0), z_dir=(0, 0, -1))) as chamfer1_piece_28b_section:
        with BuildLine():
            Line((0.411469278, 0), (-0.022618862, 0.410847117))
            Line((-0.022618862, 0.410847117), (-0.030615837, 0.41062715))
            ThreePointArc((-0.030615837, 0.41062715), (-0.013651691, 0.205359132), (-0.007996975, -0.000219967))
            Line((-0.007996975, -0.000219967), (0.000219967, -0.007996975))
            ThreePointArc((0.000219967, -0.007996975), (0.205799066, -0.00234226), (0.411689245, -0.007996975))
            Line((0.411689245, -0.007996975), (0.411469278, 0))
        make_face()
    chamfer1_piece_28b = extrude(amount=1.828673195, mode=Mode.PRIVATE)
    chamfer1_piece_28b = split(chamfer1_piece_28b, bisect_by=Plane(origin=(9.848335675, 0.12723725, 3.951664325), z_dir=(0.7071067811865437, 0, 0.7071067811865513)), keep=Keep.TOP, mode=Mode.PRIVATE)
    chamfer1_piece_28 = chamfer1_piece_28a & chamfer1_piece_28b
    add(chamfer1_piece_28, mode=Mode.SUBTRACT)
    with BuildSketch(Plane(origin=(-8.492618208, 0, 5.307381792), x_dir=(0.019442520806011977, 0.9996219169112968, -0.019442520806012123), z_dir=(-0.7071067811865501, 0, -0.7071067811865449))) as chamfer1_piece_29a_section:
        with BuildLine():
            Line((0.411469278, 0), (-0.022618862, -0.410847117))
            Line((-0.022618862, -0.410847117), (-0.030615837, -0.41062715))
            ThreePointArc((-0.030615837, -0.41062715), (-0.013651691, -0.205359132), (-0.007996975, 0.000219967))
            Line((-0.007996975, 0.000219967), (0.000219967, 0.007996975))
            ThreePointArc((0.000219967, 0.007996975), (0.205799066, 0.00234226), (0.411689245, 0.007996975))
            Line((0.411689245, 0.007996975), (0.411469278, 0))
        make_face()
    chamfer1_piece_29a = extrude(amount=3.160432969, mode=Mode.PRIVATE)
    chamfer1_piece_29a = split(chamfer1_piece_29a, bisect_by=Plane(origin=(-10, 0.12723725, 3.585514254), z_dir=(-1, 0, 0)), keep=Keep.TOP, mode=Mode.PRIVATE)
    with BuildSketch(Plane(origin=(-10, 0, 4.828673195), x_dir=(0.02749587661058735, 0.9996219169112966, 0), z_dir=(0, 0, -1))) as chamfer1_piece_29b_section:
        with BuildLine():
            Line((0.411469278, 0), (-0.022618862, -0.410847117))
            Line((-0.022618862, -0.410847117), (-0.030615837, -0.41062715))
            ThreePointArc((-0.030615837, -0.41062715), (-0.013651691, -0.205359132), (-0.007996975, 0.000219967))
            Line((-0.007996975, 0.000219967), (0.000219967, 0.007996975))
            ThreePointArc((0.000219967, 0.007996975), (0.205799066, 0.00234226), (0.411689245, 0.007996975))
            Line((0.411689245, 0.007996975), (0.411469278, 0))
        make_face()
    chamfer1_piece_29b = extrude(amount=1.828673195, mode=Mode.PRIVATE)
    chamfer1_piece_29b = split(chamfer1_piece_29b, bisect_by=Plane(origin=(-9.848335675, 0.12723725, 3.951664325), z_dir=(-0.7071067811865449, 0, 0.7071067811865501)), keep=Keep.TOP, mode=Mode.PRIVATE)
    chamfer1_piece_29 = chamfer1_piece_29a & chamfer1_piece_29b
    add(chamfer1_piece_29, mode=Mode.SUBTRACT)
    with BuildSketch(Plane(origin=(7.528673195, 12, -3), x_dir=(0, -0.9996219169112968, 0.027495876610586226), z_dir=(-1, 0, 0))) as chamfer1_piece_30a_section:
        with BuildLine():
            Line((0.411469278, 0), (-0.022618862, -0.410847117))
            Line((-0.022618862, -0.410847117), (-0.030615837, -0.41062715))
            ThreePointArc((-0.030615837, -0.41062715), (-0.013651691, -0.205359132), (-0.007996975, 0.000219967))
            Line((-0.007996975, 0.000219967), (0.000219967, 0.007996975))
            ThreePointArc((0.000219967, 0.007996975), (0.205799066, 0.00234226), (0.411689245, 0.007996975))
            Line((0.411689245, 0.007996975), (0.411469278, 0))
        make_face()
    chamfer1_piece_30a = extrude(amount=14.028673195, mode=Mode.PRIVATE)
    chamfer1_piece_30a = split(chamfer1_piece_30a, bisect_by=Plane(origin=(6.5, 11.868082549, -3.131917451), z_dir=(1, 0, 0)), keep=Keep.TOP, mode=Mode.PRIVATE)
    with BuildSketch(Plane(origin=(6.5, 12, 4.028673195), x_dir=(-0.027495876610587302, -0.9996219169112966, 0), z_dir=(0, 0, -1))) as chamfer1_piece_30b_section:
        with BuildLine():
            Line((0.411469278, 0), (-0.022618862, -0.410847117))
            Line((-0.022618862, -0.410847117), (-0.030615837, -0.41062715))
            ThreePointArc((-0.030615837, -0.41062715), (-0.013651691, -0.205359132), (-0.007996975, 0.000219967))
            Line((-0.007996975, 0.000219967), (0.000219967, 0.007996975))
            ThreePointArc((0.000219967, 0.007996975), (0.205799066, 0.00234226), (0.411689245, 0.007996975))
            Line((0.411689245, 0.007996975), (0.411469278, 0))
        make_face()
    chamfer1_piece_30b = extrude(amount=8.05734639, mode=Mode.PRIVATE)
    chamfer1_piece_30b = split(chamfer1_piece_30b, bisect_by=Plane(origin=(6.631917451, 11.868082549, -3), z_dir=(0, 0, -1)), keep=Keep.TOP, mode=Mode.PRIVATE)
    chamfer1_piece_30 = chamfer1_piece_30a & chamfer1_piece_30b
    add(chamfer1_piece_30, mode=Mode.SUBTRACT)
    with BuildSketch(Plane(origin=(-6.5, 12, -4.028673195), x_dir=(0.027495876610587302, -0.9996219169112966, 0), z_dir=(0, 0, 1))) as chamfer1_piece_31a_section:
        with BuildLine():
            Line((0.411469278, 0), (-0.022618862, -0.410847117))
            Line((-0.022618862, -0.410847117), (-0.030615837, -0.41062715))
            ThreePointArc((-0.030615837, -0.41062715), (-0.013651691, -0.205359132), (-0.007996975, 0.000219967))
            Line((-0.007996975, 0.000219967), (0.000219967, 0.007996975))
            ThreePointArc((0.000219967, 0.007996975), (0.205799066, 0.00234226), (0.411689245, 0.007996975))
            Line((0.411689245, 0.007996975), (0.411469278, 0))
        make_face()
    chamfer1_piece_31a = extrude(amount=8.05734639, mode=Mode.PRIVATE)
    chamfer1_piece_31a = split(chamfer1_piece_31a, bisect_by=Plane(origin=(-6.631917451, 11.868082549, -3), z_dir=(0, 0, -1)), keep=Keep.TOP, mode=Mode.PRIVATE)
    with BuildSketch(Plane(origin=(6.5, 12, -3), x_dir=(0, -0.9996219169112968, 0.027495876610586226), z_dir=(-1, 0, 0))) as chamfer1_piece_31b_section:
        with BuildLine():
            Line((0.411469278, 0), (-0.022618862, -0.410847117))
            Line((-0.022618862, -0.410847117), (-0.030615837, -0.41062715))
            ThreePointArc((-0.030615837, -0.41062715), (-0.013651691, -0.205359132), (-0.007996975, 0.000219967))
            Line((-0.007996975, 0.000219967), (0.000219967, 0.007996975))
            ThreePointArc((0.000219967, 0.007996975), (0.205799066, 0.00234226), (0.411689245, 0.007996975))
            Line((0.411689245, 0.007996975), (0.411469278, 0))
        make_face()
    chamfer1_piece_31b = extrude(amount=14.028673195, mode=Mode.PRIVATE)
    chamfer1_piece_31b = split(chamfer1_piece_31b, bisect_by=Plane(origin=(-6.5, 11.868082549, -3.131917451), z_dir=(-1, 0, 0)), keep=Keep.TOP, mode=Mode.PRIVATE)
    chamfer1_piece_31 = chamfer1_piece_31a & chamfer1_piece_31b
    add(chamfer1_piece_31, mode=Mode.SUBTRACT)
    with BuildSketch(Plane(origin=(8.971326805, 6, -5), x_dir=(0, -0.9996219169112966, -0.027495876610587302), z_dir=(1, 0, 0))) as chamfer1_piece_32a_section:
        with BuildLine():
            Line((0.411469278, 0), (-0.022618862, -0.410847117))
            Line((-0.022618862, -0.410847117), (-0.030615837, -0.41062715))
            ThreePointArc((-0.030615837, -0.41062715), (-0.013651691, -0.205359132), (-0.007996975, 0.000219967))
            Line((-0.007996975, 0.000219967), (0.000219967, 0.007996975))
            ThreePointArc((0.000219967, 0.007996975), (0.205799066, 0.00234226), (0.411689245, 0.007996975))
            Line((0.411689245, 0.007996975), (0.411469278, 0))
        make_face()
    chamfer1_piece_32a = extrude(amount=10.05734639, mode=Mode.PRIVATE)
    chamfer1_piece_32a = split(chamfer1_piece_32a, bisect_by=Plane(origin=(10, 5.868082549, -4.868082549), z_dir=(-1, 0, 0)), keep=Keep.TOP, mode=Mode.PRIVATE)
    with BuildSketch(Plane(origin=(10, 4.971326805, -5), x_dir=(-0.9996219169112966, 0, -0.027495876610587302), z_dir=(0, 1, 0))) as chamfer1_piece_32b_section:
        with BuildLine():
            Line((0.411469278, 0), (-0.022618862, 0.410847117))
            Line((-0.022618862, 0.410847117), (-0.030615837, 0.41062715))
            ThreePointArc((-0.030615837, 0.41062715), (-0.013651691, 0.205359132), (-0.007996975, -0.000219967))
            Line((-0.007996975, -0.000219967), (0.000219967, -0.007996975))
            ThreePointArc((0.000219967, -0.007996975), (0.205799066, -0.00234226), (0.411689245, -0.007996975))
            Line((0.411689245, -0.007996975), (0.411469278, 0))
        make_face()
    chamfer1_piece_32b = extrude(amount=8.05734639, mode=Mode.PRIVATE)
    chamfer1_piece_32b = split(chamfer1_piece_32b, bisect_by=Plane(origin=(9.868082549, 6, -4.868082549), z_dir=(0, -1, 0)), keep=Keep.TOP, mode=Mode.PRIVATE)
    chamfer1_piece_32 = chamfer1_piece_32a & chamfer1_piece_32b
    add(chamfer1_piece_32, mode=Mode.SUBTRACT)
    with BuildSketch(Plane(origin=(-10, 4.971326805, -5), x_dir=(-0.027495876610587302, 0, 0.9996219169112966), z_dir=(0, 1, 0))) as chamfer1_piece_33a_section:
        with BuildLine():
            Line((0.411469278, 0), (-0.022618862, 0.410847117))
            Line((-0.022618862, 0.410847117), (-0.030615837, 0.41062715))
            ThreePointArc((-0.030615837, 0.41062715), (-0.013651691, 0.205359132), (-0.007996975, -0.000219967))
            Line((-0.007996975, -0.000219967), (0.000219967, -0.007996975))
            ThreePointArc((0.000219967, -0.007996975), (0.205799066, -0.00234226), (0.411689245, -0.007996975))
            Line((0.411689245, -0.007996975), (0.411469278, 0))
        make_face()
    chamfer1_piece_33a = extrude(amount=8.05734639, mode=Mode.PRIVATE)
    chamfer1_piece_33a = split(chamfer1_piece_33a, bisect_by=Plane(origin=(-9.868082549, 6, -4.868082549), z_dir=(0, -1, 0)), keep=Keep.TOP, mode=Mode.PRIVATE)
    with BuildSketch(Plane(origin=(-19.028673195, 6, -5), x_dir=(0, -0.9996219169112966, -0.027495876610587302), z_dir=(1, 0, 0))) as chamfer1_piece_33b_section:
        with BuildLine():
            Line((0.411469278, 0), (-0.022618862, -0.410847117))
            Line((-0.022618862, -0.410847117), (-0.030615837, -0.41062715))
            ThreePointArc((-0.030615837, -0.41062715), (-0.013651691, -0.205359132), (-0.007996975, 0.000219967))
            Line((-0.007996975, 0.000219967), (0.000219967, 0.007996975))
            ThreePointArc((0.000219967, 0.007996975), (0.205799066, 0.00234226), (0.411689245, 0.007996975))
            Line((0.411689245, 0.007996975), (0.411469278, 0))
        make_face()
    chamfer1_piece_33b = extrude(amount=10.05734639, mode=Mode.PRIVATE)
    chamfer1_piece_33b = split(chamfer1_piece_33b, bisect_by=Plane(origin=(-10, 5.868082549, -4.868082549), z_dir=(1, 0, 0)), keep=Keep.TOP, mode=Mode.PRIVATE)
    chamfer1_piece_33 = chamfer1_piece_33a & chamfer1_piece_33b
    add(chamfer1_piece_33, mode=Mode.SUBTRACT)


solid = part.part
